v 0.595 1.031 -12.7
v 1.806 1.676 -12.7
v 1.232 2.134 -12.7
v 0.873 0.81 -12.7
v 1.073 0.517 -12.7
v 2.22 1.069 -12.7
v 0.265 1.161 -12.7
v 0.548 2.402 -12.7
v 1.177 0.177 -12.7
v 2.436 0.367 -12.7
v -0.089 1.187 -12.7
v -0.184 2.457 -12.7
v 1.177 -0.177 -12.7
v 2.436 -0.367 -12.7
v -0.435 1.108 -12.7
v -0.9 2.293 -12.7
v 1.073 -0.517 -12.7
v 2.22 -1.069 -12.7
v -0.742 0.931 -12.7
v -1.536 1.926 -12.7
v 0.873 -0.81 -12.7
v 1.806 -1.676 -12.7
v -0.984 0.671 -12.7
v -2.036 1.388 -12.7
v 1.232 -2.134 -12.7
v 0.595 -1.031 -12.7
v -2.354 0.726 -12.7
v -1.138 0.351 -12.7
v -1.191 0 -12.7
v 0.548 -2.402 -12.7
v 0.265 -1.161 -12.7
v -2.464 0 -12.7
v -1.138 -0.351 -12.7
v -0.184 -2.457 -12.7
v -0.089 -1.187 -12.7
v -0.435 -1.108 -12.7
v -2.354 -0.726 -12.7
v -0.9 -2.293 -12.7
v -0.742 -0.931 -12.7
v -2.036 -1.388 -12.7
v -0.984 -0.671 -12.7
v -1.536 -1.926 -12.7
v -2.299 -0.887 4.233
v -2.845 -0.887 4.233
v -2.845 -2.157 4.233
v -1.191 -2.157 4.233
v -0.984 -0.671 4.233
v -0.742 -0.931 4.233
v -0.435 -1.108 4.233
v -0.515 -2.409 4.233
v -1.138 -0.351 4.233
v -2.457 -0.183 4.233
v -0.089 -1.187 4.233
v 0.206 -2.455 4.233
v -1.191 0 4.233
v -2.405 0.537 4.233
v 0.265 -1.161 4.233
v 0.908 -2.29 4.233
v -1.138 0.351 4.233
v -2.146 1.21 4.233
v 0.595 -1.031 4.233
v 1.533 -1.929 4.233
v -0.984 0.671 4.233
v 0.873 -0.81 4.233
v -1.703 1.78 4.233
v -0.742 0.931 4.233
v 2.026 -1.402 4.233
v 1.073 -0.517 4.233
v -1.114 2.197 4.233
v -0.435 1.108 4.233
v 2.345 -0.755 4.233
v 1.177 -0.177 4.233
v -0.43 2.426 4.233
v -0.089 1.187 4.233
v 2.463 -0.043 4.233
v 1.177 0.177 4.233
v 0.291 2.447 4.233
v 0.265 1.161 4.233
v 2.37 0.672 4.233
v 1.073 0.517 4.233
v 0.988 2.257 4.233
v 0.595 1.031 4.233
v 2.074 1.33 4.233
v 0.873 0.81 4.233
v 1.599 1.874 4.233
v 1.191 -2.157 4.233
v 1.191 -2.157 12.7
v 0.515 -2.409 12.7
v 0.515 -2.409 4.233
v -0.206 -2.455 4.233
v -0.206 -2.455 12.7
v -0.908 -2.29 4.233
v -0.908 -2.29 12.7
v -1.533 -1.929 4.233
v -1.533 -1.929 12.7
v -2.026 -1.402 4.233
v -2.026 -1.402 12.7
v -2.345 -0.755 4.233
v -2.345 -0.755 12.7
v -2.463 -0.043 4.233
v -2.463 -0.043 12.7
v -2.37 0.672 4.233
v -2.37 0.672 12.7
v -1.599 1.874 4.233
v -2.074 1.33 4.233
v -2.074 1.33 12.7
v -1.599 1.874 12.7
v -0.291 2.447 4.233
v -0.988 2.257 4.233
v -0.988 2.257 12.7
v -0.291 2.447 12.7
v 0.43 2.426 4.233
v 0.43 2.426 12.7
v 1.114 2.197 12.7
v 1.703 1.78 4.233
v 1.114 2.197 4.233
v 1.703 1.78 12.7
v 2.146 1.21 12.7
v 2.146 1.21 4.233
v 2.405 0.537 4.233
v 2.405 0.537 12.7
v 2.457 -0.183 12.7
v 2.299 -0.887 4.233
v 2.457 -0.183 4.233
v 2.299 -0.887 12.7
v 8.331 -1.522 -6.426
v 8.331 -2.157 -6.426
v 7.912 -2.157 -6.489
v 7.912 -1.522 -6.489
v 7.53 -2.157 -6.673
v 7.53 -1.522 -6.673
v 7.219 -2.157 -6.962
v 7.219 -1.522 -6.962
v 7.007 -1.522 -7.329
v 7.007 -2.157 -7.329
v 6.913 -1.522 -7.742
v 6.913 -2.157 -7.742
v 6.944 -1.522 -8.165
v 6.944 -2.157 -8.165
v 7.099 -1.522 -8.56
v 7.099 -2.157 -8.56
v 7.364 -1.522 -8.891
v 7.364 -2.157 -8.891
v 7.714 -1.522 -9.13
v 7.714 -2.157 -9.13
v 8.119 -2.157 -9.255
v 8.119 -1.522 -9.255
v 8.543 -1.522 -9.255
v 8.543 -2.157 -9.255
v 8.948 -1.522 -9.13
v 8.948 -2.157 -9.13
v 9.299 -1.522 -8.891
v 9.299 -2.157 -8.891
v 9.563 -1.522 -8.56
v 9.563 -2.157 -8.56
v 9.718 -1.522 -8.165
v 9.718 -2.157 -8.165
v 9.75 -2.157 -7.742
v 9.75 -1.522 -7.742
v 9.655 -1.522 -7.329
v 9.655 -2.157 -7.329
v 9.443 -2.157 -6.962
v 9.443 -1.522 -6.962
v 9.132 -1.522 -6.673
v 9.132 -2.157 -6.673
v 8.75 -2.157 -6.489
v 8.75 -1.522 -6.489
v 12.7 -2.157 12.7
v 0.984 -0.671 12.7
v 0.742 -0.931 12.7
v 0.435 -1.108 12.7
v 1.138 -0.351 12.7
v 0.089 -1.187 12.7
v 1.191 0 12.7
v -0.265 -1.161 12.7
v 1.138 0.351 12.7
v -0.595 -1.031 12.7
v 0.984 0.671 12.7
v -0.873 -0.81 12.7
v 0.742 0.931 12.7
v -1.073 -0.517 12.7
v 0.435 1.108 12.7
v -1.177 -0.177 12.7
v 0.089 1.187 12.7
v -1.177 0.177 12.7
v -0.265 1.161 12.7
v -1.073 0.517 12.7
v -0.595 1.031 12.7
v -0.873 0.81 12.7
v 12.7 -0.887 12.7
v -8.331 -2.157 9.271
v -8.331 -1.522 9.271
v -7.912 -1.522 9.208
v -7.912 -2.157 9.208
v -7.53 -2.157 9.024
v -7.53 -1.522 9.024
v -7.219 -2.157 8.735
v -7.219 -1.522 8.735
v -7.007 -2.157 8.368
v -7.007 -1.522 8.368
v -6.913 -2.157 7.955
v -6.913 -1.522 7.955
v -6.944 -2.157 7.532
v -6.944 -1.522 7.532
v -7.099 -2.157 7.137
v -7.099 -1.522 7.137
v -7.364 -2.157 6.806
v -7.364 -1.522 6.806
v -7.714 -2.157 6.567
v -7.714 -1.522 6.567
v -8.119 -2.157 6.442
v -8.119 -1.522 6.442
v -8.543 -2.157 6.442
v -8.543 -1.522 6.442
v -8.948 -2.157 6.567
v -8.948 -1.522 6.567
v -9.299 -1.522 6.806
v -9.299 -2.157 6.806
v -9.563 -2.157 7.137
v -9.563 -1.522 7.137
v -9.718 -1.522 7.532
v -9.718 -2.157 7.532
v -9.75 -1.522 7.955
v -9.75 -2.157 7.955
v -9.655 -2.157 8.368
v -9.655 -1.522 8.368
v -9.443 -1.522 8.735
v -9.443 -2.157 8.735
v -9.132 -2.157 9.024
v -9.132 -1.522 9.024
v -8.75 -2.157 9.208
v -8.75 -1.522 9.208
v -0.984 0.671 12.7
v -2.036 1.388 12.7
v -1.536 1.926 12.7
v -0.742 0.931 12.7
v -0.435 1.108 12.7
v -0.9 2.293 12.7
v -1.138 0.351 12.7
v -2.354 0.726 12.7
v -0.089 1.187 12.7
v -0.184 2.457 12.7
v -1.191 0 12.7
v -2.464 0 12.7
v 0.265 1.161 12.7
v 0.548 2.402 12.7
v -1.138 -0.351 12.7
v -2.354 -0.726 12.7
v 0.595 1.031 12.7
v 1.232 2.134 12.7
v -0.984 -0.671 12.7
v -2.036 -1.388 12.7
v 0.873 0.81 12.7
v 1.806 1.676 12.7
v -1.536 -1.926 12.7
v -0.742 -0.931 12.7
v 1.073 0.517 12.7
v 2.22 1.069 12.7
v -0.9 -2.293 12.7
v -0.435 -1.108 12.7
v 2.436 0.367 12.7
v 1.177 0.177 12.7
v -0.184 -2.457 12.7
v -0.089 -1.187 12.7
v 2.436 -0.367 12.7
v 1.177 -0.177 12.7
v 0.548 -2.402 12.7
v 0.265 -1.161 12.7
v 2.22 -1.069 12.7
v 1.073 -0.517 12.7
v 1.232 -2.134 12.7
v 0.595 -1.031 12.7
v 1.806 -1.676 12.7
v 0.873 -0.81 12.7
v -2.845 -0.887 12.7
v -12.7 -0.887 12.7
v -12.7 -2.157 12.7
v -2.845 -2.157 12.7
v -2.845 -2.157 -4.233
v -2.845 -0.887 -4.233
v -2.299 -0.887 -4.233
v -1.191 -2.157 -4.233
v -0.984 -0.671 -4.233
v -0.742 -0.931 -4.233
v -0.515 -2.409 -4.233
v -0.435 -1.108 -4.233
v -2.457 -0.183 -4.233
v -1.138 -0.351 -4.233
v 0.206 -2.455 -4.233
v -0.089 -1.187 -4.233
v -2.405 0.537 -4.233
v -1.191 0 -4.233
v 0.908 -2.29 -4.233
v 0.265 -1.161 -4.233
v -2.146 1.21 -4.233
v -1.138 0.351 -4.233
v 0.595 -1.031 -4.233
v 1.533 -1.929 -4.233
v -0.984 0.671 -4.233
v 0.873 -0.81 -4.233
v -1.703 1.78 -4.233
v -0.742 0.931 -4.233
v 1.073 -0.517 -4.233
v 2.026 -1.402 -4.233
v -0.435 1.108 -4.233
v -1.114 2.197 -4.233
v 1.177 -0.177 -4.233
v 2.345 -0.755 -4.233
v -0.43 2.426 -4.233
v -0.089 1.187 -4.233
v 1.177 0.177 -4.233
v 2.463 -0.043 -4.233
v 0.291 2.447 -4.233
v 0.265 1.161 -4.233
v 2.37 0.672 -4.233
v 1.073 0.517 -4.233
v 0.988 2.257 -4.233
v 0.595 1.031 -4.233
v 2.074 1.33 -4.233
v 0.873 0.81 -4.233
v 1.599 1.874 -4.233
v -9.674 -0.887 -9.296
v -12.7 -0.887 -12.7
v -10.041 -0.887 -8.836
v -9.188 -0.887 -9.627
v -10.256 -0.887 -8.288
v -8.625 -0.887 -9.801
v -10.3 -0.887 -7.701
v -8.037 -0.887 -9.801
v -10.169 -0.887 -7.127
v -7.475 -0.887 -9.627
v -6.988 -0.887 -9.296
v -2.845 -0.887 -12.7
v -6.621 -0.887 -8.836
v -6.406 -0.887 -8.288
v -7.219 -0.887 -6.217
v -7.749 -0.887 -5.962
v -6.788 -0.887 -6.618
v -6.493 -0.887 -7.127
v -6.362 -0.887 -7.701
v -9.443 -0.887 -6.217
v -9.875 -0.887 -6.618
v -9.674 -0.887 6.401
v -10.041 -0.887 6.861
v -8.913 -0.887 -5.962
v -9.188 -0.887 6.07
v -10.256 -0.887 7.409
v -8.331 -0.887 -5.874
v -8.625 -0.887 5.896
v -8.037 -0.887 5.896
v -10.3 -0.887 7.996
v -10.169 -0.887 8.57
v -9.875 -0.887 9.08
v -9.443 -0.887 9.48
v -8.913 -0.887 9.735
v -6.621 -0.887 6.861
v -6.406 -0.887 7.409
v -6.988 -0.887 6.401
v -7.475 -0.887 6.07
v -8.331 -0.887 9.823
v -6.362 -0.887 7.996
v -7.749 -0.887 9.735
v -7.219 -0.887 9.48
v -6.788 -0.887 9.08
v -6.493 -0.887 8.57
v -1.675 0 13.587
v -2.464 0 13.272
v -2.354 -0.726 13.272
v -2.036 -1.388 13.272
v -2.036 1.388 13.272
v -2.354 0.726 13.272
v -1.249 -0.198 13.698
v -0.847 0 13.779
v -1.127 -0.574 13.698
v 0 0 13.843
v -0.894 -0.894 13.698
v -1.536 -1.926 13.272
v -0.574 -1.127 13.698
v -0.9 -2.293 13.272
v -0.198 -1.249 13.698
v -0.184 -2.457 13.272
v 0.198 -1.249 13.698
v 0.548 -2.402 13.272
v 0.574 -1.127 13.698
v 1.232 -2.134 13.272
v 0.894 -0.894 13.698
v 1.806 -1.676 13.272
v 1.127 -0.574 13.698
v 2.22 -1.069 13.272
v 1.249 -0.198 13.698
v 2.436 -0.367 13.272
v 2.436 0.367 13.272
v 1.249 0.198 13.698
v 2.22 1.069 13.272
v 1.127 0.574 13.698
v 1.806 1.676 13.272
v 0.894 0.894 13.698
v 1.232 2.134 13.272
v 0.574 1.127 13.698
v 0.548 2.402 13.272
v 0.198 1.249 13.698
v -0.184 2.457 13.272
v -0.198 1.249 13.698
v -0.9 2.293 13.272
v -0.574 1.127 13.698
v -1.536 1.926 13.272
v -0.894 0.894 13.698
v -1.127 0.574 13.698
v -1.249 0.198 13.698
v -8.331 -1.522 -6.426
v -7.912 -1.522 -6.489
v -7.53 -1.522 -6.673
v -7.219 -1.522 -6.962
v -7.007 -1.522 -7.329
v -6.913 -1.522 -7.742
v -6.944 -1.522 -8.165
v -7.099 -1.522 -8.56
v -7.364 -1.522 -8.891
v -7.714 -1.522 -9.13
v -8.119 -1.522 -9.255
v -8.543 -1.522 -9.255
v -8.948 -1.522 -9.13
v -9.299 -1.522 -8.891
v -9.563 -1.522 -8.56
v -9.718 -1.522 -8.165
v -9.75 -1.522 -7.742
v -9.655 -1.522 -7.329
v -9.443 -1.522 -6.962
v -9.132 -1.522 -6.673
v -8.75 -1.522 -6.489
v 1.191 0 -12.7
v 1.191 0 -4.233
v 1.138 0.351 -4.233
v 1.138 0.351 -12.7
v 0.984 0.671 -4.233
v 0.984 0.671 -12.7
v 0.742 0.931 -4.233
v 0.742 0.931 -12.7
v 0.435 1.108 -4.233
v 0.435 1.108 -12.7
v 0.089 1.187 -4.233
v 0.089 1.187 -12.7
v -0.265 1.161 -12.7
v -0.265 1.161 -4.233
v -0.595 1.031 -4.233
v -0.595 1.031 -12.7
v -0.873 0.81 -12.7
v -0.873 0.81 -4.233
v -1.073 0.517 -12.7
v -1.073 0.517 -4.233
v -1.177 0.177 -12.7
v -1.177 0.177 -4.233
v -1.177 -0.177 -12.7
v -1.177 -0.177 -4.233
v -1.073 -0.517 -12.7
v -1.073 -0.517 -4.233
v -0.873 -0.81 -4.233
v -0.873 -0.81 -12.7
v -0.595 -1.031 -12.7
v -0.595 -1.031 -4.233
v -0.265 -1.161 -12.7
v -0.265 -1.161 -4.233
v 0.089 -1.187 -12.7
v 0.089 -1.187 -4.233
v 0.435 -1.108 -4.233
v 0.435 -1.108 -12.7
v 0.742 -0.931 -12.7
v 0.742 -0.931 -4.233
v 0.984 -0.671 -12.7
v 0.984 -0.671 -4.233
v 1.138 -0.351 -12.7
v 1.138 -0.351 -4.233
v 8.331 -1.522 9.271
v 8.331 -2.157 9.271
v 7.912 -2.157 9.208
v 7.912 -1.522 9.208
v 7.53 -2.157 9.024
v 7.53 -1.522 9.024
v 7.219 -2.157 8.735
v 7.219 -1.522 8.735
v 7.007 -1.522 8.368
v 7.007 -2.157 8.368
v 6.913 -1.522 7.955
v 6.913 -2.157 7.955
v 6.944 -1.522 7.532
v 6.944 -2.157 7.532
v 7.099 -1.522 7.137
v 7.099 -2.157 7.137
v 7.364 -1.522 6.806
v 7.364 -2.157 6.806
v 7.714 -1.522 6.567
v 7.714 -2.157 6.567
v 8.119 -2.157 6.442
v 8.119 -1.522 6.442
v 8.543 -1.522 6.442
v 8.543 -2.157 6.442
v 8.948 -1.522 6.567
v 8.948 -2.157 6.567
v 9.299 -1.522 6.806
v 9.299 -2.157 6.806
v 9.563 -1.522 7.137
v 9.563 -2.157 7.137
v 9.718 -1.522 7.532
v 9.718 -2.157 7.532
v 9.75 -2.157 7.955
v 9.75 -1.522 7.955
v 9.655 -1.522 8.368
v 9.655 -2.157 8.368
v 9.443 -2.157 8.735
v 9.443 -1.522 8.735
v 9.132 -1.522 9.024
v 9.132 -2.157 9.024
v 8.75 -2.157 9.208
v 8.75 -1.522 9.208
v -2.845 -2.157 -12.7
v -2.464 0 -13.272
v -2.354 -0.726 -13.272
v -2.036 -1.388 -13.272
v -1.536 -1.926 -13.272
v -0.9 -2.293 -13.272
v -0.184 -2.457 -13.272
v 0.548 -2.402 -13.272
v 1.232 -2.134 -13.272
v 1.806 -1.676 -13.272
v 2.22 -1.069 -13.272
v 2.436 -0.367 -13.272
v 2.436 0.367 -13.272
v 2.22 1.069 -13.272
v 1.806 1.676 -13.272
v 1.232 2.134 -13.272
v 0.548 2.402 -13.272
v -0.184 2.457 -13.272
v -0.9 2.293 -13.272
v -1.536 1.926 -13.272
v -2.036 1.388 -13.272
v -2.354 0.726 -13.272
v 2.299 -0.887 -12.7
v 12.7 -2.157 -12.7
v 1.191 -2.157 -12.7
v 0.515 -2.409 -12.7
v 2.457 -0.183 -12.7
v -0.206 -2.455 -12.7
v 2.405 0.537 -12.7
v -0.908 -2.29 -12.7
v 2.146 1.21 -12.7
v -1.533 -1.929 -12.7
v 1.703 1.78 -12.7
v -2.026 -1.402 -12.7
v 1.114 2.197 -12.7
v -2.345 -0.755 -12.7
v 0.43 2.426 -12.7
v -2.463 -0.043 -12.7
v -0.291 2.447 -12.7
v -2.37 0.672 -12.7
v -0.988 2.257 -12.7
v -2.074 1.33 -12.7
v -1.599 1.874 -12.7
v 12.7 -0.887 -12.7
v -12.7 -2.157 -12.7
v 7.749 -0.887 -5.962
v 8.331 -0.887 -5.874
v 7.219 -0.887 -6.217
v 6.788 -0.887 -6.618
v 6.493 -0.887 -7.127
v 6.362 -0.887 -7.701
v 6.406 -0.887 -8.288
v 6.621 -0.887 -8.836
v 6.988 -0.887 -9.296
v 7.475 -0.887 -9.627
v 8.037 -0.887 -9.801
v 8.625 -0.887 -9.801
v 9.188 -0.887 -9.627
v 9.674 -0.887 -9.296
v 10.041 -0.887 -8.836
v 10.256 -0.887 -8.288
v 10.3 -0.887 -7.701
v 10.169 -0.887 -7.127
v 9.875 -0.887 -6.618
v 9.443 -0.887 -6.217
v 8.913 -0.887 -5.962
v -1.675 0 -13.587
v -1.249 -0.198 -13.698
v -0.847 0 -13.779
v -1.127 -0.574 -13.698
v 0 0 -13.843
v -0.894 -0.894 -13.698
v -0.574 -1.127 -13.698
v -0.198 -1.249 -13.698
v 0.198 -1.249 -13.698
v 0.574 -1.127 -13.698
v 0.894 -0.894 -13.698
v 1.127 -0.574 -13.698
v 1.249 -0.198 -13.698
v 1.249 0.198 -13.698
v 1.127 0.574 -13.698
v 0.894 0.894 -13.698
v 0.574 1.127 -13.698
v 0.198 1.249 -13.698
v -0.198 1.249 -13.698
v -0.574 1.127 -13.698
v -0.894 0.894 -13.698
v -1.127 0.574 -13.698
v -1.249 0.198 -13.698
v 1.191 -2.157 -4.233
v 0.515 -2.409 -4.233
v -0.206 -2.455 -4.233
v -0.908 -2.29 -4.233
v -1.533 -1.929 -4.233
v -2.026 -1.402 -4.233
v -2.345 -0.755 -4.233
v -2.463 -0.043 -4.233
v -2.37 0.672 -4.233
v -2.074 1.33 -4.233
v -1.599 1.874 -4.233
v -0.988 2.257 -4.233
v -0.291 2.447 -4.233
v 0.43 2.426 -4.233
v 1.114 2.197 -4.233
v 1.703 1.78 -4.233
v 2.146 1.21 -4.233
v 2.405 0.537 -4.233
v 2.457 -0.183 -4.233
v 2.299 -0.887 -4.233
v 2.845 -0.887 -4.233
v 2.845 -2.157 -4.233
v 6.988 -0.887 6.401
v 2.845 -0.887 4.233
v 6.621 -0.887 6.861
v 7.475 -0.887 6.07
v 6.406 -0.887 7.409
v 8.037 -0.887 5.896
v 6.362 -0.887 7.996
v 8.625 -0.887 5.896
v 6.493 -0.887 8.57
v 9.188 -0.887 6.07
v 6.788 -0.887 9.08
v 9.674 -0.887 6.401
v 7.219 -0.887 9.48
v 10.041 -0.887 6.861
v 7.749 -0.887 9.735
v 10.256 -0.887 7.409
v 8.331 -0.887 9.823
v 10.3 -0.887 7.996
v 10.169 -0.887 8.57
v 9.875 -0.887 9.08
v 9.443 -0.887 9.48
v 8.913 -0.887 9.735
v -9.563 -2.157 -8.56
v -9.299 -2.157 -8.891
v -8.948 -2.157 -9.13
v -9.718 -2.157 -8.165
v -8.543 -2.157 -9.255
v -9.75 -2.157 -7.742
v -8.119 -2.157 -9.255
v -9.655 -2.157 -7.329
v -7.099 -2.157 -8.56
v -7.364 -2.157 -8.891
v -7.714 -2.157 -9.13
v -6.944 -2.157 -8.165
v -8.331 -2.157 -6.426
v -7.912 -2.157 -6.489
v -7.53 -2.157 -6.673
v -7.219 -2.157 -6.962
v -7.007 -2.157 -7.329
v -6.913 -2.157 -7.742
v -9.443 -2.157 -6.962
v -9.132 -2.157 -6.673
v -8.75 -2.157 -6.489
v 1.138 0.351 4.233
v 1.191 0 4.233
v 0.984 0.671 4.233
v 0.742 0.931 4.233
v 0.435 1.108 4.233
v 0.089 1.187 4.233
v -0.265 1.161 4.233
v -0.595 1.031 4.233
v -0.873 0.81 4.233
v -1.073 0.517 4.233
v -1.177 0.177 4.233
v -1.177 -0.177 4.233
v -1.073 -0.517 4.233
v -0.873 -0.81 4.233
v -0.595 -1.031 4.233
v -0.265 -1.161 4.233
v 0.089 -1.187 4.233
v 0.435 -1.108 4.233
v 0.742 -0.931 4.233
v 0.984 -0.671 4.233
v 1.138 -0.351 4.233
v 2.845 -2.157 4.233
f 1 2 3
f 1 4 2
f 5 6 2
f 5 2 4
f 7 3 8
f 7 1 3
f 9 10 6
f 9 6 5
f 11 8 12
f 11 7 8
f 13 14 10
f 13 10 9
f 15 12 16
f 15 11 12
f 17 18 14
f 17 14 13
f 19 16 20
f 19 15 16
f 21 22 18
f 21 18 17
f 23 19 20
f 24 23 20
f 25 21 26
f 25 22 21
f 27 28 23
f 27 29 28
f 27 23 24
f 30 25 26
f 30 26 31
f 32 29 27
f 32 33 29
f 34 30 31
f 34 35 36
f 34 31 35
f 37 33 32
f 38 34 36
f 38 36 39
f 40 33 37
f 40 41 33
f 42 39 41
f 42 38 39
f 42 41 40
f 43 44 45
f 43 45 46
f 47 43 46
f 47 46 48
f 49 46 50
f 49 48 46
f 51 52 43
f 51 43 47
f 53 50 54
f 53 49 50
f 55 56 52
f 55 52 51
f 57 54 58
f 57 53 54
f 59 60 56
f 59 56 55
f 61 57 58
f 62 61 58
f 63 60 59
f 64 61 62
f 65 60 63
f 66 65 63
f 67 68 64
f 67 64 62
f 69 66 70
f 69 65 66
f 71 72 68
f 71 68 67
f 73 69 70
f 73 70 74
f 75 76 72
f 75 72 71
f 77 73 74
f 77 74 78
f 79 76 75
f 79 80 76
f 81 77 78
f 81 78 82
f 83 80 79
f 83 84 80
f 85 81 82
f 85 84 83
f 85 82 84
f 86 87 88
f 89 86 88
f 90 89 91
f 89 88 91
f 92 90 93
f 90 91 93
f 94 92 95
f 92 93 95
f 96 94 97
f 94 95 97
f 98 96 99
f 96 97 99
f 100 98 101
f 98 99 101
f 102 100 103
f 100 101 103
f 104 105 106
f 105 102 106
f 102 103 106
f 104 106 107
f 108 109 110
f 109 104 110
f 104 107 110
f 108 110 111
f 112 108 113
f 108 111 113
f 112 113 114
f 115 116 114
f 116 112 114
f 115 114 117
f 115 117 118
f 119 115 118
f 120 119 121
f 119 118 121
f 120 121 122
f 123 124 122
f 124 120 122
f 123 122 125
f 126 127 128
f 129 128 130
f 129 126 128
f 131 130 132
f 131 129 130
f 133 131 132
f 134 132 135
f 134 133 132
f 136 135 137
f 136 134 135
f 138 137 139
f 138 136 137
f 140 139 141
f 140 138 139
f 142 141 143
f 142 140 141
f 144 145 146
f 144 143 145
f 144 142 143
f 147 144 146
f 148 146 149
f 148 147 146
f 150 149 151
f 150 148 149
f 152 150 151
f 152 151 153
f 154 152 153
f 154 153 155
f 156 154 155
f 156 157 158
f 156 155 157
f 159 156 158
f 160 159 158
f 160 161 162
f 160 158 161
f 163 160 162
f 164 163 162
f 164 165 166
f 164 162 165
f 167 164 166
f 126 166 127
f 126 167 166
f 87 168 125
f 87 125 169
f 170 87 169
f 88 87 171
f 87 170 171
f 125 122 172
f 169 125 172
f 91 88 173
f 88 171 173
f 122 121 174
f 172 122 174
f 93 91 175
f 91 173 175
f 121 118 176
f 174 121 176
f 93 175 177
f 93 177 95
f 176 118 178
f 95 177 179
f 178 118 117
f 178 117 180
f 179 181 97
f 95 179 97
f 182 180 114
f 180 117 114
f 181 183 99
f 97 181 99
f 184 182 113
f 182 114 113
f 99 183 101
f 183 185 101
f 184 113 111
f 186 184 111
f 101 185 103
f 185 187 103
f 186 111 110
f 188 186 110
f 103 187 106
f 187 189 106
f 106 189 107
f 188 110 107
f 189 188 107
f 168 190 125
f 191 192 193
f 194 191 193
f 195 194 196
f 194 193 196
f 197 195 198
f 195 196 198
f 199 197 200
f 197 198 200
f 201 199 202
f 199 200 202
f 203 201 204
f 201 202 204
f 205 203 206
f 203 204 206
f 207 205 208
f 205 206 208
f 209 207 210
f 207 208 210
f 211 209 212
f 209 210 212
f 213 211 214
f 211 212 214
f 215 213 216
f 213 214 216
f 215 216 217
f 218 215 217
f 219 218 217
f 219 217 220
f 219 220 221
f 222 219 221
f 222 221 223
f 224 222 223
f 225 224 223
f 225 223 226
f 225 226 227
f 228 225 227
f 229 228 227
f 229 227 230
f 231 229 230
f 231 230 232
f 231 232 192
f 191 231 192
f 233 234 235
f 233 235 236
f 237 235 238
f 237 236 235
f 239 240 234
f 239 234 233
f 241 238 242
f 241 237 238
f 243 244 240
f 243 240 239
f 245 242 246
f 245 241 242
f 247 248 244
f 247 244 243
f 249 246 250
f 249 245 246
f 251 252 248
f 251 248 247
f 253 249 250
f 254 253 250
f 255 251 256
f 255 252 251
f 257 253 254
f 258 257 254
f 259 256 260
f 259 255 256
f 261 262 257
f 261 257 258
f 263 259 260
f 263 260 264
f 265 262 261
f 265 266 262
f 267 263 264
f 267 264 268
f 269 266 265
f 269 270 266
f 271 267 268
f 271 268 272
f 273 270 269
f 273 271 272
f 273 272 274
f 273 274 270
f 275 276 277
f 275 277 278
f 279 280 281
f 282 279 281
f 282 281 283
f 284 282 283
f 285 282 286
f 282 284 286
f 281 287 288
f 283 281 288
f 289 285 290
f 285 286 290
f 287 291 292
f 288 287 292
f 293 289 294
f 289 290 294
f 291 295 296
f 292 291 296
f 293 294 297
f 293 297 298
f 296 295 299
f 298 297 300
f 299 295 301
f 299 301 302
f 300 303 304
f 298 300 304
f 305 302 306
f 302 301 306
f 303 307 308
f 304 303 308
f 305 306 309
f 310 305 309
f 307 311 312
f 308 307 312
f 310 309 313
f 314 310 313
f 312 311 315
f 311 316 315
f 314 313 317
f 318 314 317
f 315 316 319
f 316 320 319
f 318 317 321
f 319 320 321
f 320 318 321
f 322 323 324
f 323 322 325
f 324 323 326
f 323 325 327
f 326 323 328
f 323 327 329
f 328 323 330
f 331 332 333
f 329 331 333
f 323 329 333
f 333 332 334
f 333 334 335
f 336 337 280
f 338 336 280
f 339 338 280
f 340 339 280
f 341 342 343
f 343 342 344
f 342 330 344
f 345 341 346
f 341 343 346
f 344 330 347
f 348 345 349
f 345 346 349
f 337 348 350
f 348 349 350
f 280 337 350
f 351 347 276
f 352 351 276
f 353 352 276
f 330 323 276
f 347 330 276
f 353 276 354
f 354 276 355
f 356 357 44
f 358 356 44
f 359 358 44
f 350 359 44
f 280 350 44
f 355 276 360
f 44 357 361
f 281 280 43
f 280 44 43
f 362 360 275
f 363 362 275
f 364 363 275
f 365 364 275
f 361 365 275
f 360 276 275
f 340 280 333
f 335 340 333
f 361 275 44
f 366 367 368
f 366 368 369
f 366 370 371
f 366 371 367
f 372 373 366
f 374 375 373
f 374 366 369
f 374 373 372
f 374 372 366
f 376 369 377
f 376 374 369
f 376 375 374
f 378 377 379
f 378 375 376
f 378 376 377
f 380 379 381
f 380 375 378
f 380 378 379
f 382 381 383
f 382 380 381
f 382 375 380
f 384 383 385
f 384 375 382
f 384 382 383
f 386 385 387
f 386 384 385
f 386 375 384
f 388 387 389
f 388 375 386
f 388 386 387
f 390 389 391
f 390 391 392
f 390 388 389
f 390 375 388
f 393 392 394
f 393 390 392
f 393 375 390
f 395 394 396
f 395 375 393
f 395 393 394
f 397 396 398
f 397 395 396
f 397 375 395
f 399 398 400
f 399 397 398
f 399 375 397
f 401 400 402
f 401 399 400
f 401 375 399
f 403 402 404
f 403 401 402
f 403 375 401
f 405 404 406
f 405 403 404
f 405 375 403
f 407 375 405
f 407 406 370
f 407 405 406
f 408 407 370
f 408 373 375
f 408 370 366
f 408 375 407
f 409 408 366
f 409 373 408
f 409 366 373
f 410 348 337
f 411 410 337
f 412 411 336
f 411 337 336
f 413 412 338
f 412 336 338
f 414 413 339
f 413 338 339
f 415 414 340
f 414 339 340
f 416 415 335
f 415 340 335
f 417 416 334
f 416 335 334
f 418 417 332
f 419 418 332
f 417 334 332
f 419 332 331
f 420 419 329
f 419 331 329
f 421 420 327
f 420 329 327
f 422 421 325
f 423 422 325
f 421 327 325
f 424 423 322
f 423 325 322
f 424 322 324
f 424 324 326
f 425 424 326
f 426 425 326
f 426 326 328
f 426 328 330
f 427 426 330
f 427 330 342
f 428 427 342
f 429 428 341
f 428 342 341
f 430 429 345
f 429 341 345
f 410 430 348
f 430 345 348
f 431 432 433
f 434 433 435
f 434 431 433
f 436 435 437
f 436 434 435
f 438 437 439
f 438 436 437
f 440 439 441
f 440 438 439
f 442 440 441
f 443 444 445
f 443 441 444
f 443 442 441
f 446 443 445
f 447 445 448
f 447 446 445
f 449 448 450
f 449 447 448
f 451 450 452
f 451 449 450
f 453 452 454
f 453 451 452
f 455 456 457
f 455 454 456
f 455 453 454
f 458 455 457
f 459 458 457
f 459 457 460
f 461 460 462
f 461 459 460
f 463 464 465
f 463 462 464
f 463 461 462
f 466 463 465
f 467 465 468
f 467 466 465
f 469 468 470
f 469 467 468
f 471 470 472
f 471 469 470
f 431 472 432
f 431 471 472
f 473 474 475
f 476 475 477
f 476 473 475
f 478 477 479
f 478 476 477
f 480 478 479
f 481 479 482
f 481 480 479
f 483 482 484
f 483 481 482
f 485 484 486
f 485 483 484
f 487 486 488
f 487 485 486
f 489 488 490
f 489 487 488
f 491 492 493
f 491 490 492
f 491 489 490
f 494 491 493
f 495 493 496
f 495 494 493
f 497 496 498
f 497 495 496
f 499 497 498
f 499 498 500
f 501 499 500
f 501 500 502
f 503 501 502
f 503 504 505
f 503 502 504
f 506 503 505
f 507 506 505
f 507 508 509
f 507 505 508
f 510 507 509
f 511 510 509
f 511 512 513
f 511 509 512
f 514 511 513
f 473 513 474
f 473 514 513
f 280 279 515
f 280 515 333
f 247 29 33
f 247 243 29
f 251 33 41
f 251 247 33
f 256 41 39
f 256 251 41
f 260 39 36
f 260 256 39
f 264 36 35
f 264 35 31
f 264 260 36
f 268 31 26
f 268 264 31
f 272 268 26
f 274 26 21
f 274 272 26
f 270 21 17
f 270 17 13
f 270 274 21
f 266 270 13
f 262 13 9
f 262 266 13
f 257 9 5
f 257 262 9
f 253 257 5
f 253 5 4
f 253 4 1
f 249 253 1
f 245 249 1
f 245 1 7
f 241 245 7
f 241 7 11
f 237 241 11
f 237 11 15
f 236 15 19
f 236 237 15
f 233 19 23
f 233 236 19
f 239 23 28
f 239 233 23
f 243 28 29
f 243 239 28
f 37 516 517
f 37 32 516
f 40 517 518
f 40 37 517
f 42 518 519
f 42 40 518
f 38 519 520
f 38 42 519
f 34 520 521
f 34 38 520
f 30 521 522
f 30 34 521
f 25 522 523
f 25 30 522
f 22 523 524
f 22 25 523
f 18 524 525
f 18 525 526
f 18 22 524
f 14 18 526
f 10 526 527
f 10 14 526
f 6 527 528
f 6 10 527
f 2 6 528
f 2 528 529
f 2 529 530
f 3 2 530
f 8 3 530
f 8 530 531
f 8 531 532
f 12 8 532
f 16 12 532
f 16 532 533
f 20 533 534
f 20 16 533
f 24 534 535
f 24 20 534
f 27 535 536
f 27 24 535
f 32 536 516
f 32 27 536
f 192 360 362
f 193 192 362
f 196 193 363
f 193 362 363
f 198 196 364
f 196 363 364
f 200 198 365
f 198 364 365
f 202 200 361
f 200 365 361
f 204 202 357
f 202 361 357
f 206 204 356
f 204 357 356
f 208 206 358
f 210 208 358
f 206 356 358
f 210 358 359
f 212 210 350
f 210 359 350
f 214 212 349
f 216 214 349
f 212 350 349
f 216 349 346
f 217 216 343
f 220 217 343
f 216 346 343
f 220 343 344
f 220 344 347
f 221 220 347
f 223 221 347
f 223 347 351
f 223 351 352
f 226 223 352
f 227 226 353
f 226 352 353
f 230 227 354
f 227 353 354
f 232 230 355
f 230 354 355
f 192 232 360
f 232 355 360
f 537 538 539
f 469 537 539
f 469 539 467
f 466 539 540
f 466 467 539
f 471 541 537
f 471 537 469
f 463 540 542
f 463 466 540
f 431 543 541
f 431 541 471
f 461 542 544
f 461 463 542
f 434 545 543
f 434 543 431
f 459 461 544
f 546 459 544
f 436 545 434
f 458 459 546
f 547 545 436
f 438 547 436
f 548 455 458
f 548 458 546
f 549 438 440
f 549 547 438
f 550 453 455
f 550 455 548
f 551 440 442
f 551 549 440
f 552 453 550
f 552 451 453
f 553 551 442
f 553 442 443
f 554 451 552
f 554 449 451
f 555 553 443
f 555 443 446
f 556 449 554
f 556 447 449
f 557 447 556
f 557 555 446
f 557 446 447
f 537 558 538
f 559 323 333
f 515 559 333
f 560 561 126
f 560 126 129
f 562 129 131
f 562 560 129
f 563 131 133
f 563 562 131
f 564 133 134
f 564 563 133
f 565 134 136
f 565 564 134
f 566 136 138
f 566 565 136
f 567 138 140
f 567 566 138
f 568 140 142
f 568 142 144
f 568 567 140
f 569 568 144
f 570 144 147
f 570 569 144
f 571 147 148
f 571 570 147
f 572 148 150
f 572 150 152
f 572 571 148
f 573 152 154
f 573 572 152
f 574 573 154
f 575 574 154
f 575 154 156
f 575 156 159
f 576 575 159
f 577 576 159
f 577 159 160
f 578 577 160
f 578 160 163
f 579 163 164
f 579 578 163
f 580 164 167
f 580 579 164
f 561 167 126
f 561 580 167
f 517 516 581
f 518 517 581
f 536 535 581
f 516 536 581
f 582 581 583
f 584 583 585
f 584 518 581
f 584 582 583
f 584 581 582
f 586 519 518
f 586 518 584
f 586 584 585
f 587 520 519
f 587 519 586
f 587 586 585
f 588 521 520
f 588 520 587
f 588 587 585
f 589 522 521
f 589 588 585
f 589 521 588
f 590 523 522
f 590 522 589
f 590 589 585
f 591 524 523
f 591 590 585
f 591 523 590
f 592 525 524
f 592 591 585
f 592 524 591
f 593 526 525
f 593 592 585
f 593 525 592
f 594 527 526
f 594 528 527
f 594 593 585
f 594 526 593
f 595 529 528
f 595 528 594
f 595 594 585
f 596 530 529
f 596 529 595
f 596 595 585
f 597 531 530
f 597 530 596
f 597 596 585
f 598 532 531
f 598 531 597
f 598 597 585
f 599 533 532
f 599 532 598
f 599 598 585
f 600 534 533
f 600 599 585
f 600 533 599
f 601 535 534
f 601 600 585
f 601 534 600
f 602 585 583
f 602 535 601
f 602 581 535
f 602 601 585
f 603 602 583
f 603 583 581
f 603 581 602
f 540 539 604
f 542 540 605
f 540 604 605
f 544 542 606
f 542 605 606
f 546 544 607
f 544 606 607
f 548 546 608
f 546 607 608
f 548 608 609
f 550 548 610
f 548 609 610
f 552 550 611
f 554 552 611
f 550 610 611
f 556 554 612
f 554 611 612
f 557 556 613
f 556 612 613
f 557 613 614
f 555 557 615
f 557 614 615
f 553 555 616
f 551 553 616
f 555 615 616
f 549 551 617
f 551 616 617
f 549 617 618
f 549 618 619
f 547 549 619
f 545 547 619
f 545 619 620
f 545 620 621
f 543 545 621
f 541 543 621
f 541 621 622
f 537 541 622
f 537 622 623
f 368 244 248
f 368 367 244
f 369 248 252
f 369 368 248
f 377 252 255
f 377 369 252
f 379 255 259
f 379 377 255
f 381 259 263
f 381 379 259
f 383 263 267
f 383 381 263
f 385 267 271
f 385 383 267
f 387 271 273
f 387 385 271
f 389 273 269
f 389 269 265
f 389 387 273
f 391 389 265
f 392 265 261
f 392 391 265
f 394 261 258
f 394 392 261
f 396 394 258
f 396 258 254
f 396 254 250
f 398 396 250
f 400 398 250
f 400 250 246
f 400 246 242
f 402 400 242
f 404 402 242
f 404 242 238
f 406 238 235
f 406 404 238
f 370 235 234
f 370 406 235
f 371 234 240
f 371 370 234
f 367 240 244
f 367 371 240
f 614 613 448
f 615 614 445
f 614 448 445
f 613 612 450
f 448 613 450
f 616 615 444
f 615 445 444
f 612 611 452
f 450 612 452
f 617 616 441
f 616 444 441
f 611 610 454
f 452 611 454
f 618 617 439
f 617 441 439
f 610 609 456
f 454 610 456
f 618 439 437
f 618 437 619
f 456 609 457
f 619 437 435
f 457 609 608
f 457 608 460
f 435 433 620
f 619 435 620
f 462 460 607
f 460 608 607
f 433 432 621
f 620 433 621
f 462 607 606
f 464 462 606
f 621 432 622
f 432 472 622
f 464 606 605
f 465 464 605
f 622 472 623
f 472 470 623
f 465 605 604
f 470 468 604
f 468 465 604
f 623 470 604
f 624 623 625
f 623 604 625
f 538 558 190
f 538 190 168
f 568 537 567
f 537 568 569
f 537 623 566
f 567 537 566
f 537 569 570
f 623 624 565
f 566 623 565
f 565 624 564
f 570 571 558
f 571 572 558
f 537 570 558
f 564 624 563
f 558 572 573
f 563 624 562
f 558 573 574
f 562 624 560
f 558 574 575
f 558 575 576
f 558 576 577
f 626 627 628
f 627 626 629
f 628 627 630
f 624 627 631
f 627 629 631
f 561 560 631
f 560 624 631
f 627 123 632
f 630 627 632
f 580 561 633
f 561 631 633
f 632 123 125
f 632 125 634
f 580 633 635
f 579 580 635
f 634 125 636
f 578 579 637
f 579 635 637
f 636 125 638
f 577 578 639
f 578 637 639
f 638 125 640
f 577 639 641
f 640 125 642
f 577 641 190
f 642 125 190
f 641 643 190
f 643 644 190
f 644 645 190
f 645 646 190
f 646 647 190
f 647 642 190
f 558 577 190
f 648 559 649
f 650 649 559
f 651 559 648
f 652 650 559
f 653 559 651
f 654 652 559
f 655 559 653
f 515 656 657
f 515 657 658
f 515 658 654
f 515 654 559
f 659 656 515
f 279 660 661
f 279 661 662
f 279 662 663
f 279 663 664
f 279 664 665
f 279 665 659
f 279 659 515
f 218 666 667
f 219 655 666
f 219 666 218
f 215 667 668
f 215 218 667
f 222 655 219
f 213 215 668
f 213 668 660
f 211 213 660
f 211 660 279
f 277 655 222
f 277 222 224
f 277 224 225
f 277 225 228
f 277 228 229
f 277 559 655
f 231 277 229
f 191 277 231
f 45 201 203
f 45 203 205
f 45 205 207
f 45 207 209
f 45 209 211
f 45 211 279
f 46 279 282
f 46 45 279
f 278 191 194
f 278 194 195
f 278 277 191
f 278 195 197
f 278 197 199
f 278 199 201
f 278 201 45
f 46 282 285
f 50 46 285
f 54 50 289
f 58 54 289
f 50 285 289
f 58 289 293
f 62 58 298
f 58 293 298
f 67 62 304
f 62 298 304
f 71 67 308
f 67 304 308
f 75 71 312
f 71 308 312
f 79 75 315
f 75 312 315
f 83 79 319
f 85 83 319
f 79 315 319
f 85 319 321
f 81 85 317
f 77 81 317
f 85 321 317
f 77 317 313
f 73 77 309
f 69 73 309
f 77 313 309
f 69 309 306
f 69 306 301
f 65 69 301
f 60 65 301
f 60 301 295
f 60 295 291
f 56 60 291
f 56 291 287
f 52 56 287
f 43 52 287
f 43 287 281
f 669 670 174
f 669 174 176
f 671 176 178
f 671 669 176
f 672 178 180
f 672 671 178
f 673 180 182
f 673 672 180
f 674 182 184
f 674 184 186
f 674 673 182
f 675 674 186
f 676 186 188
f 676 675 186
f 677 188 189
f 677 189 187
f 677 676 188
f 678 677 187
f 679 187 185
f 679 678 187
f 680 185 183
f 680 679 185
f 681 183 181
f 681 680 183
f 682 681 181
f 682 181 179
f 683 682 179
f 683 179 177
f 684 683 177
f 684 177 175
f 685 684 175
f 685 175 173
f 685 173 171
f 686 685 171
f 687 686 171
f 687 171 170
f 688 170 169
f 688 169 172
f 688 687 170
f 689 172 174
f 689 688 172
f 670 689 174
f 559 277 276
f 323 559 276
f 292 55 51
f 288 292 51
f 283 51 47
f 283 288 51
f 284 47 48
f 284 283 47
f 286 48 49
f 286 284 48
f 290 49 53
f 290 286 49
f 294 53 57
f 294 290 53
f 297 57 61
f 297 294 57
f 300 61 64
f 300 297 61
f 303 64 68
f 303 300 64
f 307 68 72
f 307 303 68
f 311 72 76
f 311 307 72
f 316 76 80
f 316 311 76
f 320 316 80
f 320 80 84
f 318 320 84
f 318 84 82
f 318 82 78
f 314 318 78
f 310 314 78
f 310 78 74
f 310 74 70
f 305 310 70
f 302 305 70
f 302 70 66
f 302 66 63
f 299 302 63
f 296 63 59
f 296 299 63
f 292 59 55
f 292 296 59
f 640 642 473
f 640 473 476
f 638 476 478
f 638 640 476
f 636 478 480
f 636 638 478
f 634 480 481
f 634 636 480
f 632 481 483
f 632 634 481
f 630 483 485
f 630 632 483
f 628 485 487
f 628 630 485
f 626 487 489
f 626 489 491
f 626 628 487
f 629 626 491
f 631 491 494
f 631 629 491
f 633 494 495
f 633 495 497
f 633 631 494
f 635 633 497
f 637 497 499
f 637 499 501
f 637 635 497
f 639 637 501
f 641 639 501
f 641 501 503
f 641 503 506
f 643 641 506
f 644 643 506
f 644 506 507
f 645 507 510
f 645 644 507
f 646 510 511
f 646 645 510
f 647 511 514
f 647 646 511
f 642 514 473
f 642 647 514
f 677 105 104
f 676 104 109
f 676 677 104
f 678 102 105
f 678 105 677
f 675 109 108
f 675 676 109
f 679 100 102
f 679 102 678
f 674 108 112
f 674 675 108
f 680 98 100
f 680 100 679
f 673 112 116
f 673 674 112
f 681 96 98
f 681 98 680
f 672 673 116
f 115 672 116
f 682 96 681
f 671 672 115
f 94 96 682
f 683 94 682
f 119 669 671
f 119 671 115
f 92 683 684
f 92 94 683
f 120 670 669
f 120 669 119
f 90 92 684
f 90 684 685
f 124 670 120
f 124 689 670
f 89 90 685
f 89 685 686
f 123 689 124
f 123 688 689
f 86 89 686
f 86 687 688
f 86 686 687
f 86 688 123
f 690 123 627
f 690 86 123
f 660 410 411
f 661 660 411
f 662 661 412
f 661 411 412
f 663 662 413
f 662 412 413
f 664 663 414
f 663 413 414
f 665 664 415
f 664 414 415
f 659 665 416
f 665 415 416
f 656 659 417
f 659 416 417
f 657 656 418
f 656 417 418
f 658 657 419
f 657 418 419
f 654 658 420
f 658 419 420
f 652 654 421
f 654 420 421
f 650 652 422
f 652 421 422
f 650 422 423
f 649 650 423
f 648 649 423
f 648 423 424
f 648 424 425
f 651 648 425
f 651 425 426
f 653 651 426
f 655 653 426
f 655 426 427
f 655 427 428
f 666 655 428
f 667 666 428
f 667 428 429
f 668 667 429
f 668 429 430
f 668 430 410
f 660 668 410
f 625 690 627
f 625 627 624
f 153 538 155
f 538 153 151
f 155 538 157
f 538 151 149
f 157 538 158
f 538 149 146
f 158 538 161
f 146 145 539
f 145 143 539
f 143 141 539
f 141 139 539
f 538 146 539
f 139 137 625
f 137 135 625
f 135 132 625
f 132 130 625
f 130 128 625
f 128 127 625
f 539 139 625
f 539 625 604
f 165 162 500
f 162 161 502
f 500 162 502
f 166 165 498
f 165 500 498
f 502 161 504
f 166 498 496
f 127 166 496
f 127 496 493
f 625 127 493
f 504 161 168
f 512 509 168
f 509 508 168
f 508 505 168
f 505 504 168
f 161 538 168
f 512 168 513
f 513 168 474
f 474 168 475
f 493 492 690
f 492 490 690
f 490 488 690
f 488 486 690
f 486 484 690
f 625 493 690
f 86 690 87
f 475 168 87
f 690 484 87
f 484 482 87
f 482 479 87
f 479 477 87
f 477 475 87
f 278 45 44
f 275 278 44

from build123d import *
from OCP.BRepFilletAPI import BRepFilletAPI_MakeChamfer

# Parameters (mm, degrees)
SKETCH1_R                 = 1.190625
EXTRUDE1_DEPTH            = 12.7
SKETCH1_W                 = 9.8552
SKETCH1_H                 = 1.27
EXTRUDE1_2_DEPTH          = 12.7
SKETCH20_R                = 1.4224
EXTRUDE24_DEPTH           = 20.082626232
CHAMFER2_SIZE             = 0.635
CHAMFER2_SIZE2            = 0.551997079
CHAMFER2_OF_MIRROR2_SIZE  = 0.635
CHAMFER2_OF_MIRROR2_SIZE2 = 0.551997079
EXTRUDE4_DEPTH            = 19.94700397
EXTRUDE4_DEPTH_BACK       = 19.94700397
SKETCH8_W                 = 5.6896
SKETCH8_H                 = 8.466666666
SKETCH9_R                 = 1.190625
EXTRUDE5_DEPTH            = 8.466666667


with BuildPart() as part:
    # Sketch1 → Extrude1 (new, symmetric)
    with BuildSketch(Plane.XY):
        with BuildLine():
            Line((12.7, -2.157017049), (1.190625, -2.157017049))
            ThreePointArc((1.190625, -2.157017049), (-1.856577095, 1.619701185), (2.298588957, -0.887017049))
            Line((2.298588957, -0.887017049), (12.7, -0.887017049))
            Line((12.7, -0.887017049), (12.7, -2.157017049))
        make_face()
        Circle(SKETCH1_R, mode=Mode.SUBTRACT)
    extrude(amount=EXTRUDE1_DEPTH, both=True)


with BuildPart() as body_2:
    # Sketch1 → Extrude1 2 (new, symmetric)
    with BuildSketch(Plane.XY):
        with Locations((-7.7724, -1.522017049)):
            Rectangle(SKETCH1_W, SKETCH1_H)
    extrude(amount=EXTRUDE1_2_DEPTH, both=True)

    # Sketch20 → Extrude24 (cut, through all)
    with BuildSketch(Plane(origin=(0, -0.887017049, 0), x_dir=(1, 0, 0), z_dir=(0, 1, 0))):
        with Locations(Location((-8.3312, 7.8486, 0), (0, 0, 270))):
            Circle(SKETCH20_R)
        with Locations(Location((-8.3312, -7.8486, 0), (0, 0, 270))):
            Circle(SKETCH20_R)
    extrude24 = extrude(amount=-EXTRUDE24_DEPTH, mode=Mode.SUBTRACT)

    # Chamfer2: one chamfer whose edges measure the first distance from different faces: ONE call of the kernel's chamfer builder (chamfer() names one face for all edges)
    chamfer2_edges_1 = [body_2.edges().sort_by_distance(p)[0] for p in [
        (-8.3312, -0.887017049, -9.271),
    ]]
    chamfer2_side_1 = [body_2.faces().sort_by_distance(p)[0] for p in [
        (-8.3312, -1.522017049, -9.271),
    ]]
    chamfer2_edges_2 = [body_2.edges().sort_by_distance(p)[0] for p in [
        (-8.3312, -0.887017049, 6.4262),
    ]]
    chamfer2_side_2 = [body_2.faces().sort_by_distance(p)[0] for p in [
        (-8.3312, -1.522017049, 6.4262),
    ]]
    chamfer2 = BRepFilletAPI_MakeChamfer(body_2.part.solid().wrapped)
    for e in chamfer2_edges_1:
        chamfer2.Add(CHAMFER2_SIZE, CHAMFER2_SIZE2, e.wrapped, chamfer2_side_1[0].wrapped)  # the first distance lies on this face
    for e in chamfer2_edges_2:
        chamfer2.Add(CHAMFER2_SIZE, CHAMFER2_SIZE2, e.wrapped, chamfer2_side_2[0].wrapped)  # the first distance lies on this face
    add(Compound.cast(chamfer2.Shape()), mode=Mode.REPLACE)

    # Sketch9 → Extrude5 (add)
    with BuildSketch(Plane.XY.offset(-4.233333333)):
        with BuildLine():
            Line((-2.298588957, -0.887017049), (-2.8448, -0.887017049))
            Line((-2.8448, -0.887017049), (-2.8448, -2.157017049))
            Line((-2.8448, -2.157017049), (-1.190625, -2.157017049))
            ThreePointArc((-1.190625, -2.157017049), (1.856577095, 1.619701185), (-2.298588957, -0.887017049))
        make_face()
        with Locations(Location((0, 0, 0), (0, 0, 180))):
            Circle(SKETCH9_R, mode=Mode.SUBTRACT)
    extrude(amount=EXTRUDE5_DEPTH)


with BuildPart() as body_3:
    # Sketch6 → Revolve1 (revolve)
    with BuildSketch(Plane(origin=(0, 0, 0), x_dir=(1, 0, 0), z_dir=(0, 1, 0))):
        with BuildLine():
            Line((-2.4638, -12.7), (-2.4638, -13.2715))
            ThreePointArc((-2.4638, -13.2715), (-1.264606924, -13.698253184), (0, -13.843))
            Line((0, -13.843), (0, 13.843))
            ThreePointArc((0, 13.843), (-1.264606924, 13.698253184), (-2.4638, 13.2715))
            Line((-2.4638, 13.2715), (-2.4638, 12.7))
            Line((-2.4638, 12.7), (-1.190625, 12.7))
            Line((-1.190625, 12.7), (-1.190625, -12.7))
            Line((-1.190625, -12.7), (-2.4638, -12.7))
        make_face()
    revolve(axis=Axis((0, 0, -13.843), (0, 0, 1)))


with BuildPart() as part_1:
    add(part.part)

    # Mirror2: Extrude24 across plane
    add(extrude24.mirror(Plane(origin=(0, 0, 0), x_dir=(0, 0, 1), z_dir=(1, 0, 0))), mode=Mode.SUBTRACT)

    # Chamfer2 of Mirror2: one chamfer whose edges measure the first distance from different faces: ONE call of the kernel's chamfer builder (chamfer() names one face for all edges)
    chamfer2_of_mirror2_edges_1 = [part_1.edges().sort_by_distance(p)[0] for p in [
        (8.3312, -0.887017049, -9.271),
    ]]
    chamfer2_of_mirror2_side_1 = [part_1.faces().sort_by_distance(p)[0] for p in [
        (8.3312, -1.522017049, -9.271),
    ]]
    chamfer2_of_mirror2_edges_2 = [part_1.edges().sort_by_distance(p)[0] for p in [
        (8.3312, -0.887017049, 6.4262),
    ]]
    chamfer2_of_mirror2_side_2 = [part_1.faces().sort_by_distance(p)[0] for p in [
        (8.3312, -1.522017049, 6.4262),
    ]]
    chamfer2_of_mirror2 = BRepFilletAPI_MakeChamfer(part_1.part.solid().wrapped)
    for e in chamfer2_of_mirror2_edges_1:
        chamfer2_of_mirror2.Add(CHAMFER2_OF_MIRROR2_SIZE, CHAMFER2_OF_MIRROR2_SIZE2, e.wrapped, chamfer2_of_mirror2_side_1[0].wrapped)  # the first distance lies on this face
    for e in chamfer2_of_mirror2_edges_2:
        chamfer2_of_mirror2.Add(CHAMFER2_OF_MIRROR2_SIZE, CHAMFER2_OF_MIRROR2_SIZE2, e.wrapped, chamfer2_of_mirror2_side_2[0].wrapped)  # the first distance lies on this face
    add(Compound.cast(chamfer2_of_mirror2.Shape()), mode=Mode.REPLACE)

    # Sketch8 → Extrude4 (cut, two sides: drawn at the far end of the back side and taken through both)
    with BuildSketch(Plane(origin=(0, 0, 0), x_dir=(1, 0, 0), z_dir=(0, 1, 0)).offset(-EXTRUDE4_DEPTH_BACK)):
        Rectangle(SKETCH8_W, SKETCH8_H)
    extrude(amount=EXTRUDE4_DEPTH + EXTRUDE4_DEPTH_BACK, mode=Mode.SUBTRACT)


solid = Compound([body_2.part, body_3.part, part_1.part])
